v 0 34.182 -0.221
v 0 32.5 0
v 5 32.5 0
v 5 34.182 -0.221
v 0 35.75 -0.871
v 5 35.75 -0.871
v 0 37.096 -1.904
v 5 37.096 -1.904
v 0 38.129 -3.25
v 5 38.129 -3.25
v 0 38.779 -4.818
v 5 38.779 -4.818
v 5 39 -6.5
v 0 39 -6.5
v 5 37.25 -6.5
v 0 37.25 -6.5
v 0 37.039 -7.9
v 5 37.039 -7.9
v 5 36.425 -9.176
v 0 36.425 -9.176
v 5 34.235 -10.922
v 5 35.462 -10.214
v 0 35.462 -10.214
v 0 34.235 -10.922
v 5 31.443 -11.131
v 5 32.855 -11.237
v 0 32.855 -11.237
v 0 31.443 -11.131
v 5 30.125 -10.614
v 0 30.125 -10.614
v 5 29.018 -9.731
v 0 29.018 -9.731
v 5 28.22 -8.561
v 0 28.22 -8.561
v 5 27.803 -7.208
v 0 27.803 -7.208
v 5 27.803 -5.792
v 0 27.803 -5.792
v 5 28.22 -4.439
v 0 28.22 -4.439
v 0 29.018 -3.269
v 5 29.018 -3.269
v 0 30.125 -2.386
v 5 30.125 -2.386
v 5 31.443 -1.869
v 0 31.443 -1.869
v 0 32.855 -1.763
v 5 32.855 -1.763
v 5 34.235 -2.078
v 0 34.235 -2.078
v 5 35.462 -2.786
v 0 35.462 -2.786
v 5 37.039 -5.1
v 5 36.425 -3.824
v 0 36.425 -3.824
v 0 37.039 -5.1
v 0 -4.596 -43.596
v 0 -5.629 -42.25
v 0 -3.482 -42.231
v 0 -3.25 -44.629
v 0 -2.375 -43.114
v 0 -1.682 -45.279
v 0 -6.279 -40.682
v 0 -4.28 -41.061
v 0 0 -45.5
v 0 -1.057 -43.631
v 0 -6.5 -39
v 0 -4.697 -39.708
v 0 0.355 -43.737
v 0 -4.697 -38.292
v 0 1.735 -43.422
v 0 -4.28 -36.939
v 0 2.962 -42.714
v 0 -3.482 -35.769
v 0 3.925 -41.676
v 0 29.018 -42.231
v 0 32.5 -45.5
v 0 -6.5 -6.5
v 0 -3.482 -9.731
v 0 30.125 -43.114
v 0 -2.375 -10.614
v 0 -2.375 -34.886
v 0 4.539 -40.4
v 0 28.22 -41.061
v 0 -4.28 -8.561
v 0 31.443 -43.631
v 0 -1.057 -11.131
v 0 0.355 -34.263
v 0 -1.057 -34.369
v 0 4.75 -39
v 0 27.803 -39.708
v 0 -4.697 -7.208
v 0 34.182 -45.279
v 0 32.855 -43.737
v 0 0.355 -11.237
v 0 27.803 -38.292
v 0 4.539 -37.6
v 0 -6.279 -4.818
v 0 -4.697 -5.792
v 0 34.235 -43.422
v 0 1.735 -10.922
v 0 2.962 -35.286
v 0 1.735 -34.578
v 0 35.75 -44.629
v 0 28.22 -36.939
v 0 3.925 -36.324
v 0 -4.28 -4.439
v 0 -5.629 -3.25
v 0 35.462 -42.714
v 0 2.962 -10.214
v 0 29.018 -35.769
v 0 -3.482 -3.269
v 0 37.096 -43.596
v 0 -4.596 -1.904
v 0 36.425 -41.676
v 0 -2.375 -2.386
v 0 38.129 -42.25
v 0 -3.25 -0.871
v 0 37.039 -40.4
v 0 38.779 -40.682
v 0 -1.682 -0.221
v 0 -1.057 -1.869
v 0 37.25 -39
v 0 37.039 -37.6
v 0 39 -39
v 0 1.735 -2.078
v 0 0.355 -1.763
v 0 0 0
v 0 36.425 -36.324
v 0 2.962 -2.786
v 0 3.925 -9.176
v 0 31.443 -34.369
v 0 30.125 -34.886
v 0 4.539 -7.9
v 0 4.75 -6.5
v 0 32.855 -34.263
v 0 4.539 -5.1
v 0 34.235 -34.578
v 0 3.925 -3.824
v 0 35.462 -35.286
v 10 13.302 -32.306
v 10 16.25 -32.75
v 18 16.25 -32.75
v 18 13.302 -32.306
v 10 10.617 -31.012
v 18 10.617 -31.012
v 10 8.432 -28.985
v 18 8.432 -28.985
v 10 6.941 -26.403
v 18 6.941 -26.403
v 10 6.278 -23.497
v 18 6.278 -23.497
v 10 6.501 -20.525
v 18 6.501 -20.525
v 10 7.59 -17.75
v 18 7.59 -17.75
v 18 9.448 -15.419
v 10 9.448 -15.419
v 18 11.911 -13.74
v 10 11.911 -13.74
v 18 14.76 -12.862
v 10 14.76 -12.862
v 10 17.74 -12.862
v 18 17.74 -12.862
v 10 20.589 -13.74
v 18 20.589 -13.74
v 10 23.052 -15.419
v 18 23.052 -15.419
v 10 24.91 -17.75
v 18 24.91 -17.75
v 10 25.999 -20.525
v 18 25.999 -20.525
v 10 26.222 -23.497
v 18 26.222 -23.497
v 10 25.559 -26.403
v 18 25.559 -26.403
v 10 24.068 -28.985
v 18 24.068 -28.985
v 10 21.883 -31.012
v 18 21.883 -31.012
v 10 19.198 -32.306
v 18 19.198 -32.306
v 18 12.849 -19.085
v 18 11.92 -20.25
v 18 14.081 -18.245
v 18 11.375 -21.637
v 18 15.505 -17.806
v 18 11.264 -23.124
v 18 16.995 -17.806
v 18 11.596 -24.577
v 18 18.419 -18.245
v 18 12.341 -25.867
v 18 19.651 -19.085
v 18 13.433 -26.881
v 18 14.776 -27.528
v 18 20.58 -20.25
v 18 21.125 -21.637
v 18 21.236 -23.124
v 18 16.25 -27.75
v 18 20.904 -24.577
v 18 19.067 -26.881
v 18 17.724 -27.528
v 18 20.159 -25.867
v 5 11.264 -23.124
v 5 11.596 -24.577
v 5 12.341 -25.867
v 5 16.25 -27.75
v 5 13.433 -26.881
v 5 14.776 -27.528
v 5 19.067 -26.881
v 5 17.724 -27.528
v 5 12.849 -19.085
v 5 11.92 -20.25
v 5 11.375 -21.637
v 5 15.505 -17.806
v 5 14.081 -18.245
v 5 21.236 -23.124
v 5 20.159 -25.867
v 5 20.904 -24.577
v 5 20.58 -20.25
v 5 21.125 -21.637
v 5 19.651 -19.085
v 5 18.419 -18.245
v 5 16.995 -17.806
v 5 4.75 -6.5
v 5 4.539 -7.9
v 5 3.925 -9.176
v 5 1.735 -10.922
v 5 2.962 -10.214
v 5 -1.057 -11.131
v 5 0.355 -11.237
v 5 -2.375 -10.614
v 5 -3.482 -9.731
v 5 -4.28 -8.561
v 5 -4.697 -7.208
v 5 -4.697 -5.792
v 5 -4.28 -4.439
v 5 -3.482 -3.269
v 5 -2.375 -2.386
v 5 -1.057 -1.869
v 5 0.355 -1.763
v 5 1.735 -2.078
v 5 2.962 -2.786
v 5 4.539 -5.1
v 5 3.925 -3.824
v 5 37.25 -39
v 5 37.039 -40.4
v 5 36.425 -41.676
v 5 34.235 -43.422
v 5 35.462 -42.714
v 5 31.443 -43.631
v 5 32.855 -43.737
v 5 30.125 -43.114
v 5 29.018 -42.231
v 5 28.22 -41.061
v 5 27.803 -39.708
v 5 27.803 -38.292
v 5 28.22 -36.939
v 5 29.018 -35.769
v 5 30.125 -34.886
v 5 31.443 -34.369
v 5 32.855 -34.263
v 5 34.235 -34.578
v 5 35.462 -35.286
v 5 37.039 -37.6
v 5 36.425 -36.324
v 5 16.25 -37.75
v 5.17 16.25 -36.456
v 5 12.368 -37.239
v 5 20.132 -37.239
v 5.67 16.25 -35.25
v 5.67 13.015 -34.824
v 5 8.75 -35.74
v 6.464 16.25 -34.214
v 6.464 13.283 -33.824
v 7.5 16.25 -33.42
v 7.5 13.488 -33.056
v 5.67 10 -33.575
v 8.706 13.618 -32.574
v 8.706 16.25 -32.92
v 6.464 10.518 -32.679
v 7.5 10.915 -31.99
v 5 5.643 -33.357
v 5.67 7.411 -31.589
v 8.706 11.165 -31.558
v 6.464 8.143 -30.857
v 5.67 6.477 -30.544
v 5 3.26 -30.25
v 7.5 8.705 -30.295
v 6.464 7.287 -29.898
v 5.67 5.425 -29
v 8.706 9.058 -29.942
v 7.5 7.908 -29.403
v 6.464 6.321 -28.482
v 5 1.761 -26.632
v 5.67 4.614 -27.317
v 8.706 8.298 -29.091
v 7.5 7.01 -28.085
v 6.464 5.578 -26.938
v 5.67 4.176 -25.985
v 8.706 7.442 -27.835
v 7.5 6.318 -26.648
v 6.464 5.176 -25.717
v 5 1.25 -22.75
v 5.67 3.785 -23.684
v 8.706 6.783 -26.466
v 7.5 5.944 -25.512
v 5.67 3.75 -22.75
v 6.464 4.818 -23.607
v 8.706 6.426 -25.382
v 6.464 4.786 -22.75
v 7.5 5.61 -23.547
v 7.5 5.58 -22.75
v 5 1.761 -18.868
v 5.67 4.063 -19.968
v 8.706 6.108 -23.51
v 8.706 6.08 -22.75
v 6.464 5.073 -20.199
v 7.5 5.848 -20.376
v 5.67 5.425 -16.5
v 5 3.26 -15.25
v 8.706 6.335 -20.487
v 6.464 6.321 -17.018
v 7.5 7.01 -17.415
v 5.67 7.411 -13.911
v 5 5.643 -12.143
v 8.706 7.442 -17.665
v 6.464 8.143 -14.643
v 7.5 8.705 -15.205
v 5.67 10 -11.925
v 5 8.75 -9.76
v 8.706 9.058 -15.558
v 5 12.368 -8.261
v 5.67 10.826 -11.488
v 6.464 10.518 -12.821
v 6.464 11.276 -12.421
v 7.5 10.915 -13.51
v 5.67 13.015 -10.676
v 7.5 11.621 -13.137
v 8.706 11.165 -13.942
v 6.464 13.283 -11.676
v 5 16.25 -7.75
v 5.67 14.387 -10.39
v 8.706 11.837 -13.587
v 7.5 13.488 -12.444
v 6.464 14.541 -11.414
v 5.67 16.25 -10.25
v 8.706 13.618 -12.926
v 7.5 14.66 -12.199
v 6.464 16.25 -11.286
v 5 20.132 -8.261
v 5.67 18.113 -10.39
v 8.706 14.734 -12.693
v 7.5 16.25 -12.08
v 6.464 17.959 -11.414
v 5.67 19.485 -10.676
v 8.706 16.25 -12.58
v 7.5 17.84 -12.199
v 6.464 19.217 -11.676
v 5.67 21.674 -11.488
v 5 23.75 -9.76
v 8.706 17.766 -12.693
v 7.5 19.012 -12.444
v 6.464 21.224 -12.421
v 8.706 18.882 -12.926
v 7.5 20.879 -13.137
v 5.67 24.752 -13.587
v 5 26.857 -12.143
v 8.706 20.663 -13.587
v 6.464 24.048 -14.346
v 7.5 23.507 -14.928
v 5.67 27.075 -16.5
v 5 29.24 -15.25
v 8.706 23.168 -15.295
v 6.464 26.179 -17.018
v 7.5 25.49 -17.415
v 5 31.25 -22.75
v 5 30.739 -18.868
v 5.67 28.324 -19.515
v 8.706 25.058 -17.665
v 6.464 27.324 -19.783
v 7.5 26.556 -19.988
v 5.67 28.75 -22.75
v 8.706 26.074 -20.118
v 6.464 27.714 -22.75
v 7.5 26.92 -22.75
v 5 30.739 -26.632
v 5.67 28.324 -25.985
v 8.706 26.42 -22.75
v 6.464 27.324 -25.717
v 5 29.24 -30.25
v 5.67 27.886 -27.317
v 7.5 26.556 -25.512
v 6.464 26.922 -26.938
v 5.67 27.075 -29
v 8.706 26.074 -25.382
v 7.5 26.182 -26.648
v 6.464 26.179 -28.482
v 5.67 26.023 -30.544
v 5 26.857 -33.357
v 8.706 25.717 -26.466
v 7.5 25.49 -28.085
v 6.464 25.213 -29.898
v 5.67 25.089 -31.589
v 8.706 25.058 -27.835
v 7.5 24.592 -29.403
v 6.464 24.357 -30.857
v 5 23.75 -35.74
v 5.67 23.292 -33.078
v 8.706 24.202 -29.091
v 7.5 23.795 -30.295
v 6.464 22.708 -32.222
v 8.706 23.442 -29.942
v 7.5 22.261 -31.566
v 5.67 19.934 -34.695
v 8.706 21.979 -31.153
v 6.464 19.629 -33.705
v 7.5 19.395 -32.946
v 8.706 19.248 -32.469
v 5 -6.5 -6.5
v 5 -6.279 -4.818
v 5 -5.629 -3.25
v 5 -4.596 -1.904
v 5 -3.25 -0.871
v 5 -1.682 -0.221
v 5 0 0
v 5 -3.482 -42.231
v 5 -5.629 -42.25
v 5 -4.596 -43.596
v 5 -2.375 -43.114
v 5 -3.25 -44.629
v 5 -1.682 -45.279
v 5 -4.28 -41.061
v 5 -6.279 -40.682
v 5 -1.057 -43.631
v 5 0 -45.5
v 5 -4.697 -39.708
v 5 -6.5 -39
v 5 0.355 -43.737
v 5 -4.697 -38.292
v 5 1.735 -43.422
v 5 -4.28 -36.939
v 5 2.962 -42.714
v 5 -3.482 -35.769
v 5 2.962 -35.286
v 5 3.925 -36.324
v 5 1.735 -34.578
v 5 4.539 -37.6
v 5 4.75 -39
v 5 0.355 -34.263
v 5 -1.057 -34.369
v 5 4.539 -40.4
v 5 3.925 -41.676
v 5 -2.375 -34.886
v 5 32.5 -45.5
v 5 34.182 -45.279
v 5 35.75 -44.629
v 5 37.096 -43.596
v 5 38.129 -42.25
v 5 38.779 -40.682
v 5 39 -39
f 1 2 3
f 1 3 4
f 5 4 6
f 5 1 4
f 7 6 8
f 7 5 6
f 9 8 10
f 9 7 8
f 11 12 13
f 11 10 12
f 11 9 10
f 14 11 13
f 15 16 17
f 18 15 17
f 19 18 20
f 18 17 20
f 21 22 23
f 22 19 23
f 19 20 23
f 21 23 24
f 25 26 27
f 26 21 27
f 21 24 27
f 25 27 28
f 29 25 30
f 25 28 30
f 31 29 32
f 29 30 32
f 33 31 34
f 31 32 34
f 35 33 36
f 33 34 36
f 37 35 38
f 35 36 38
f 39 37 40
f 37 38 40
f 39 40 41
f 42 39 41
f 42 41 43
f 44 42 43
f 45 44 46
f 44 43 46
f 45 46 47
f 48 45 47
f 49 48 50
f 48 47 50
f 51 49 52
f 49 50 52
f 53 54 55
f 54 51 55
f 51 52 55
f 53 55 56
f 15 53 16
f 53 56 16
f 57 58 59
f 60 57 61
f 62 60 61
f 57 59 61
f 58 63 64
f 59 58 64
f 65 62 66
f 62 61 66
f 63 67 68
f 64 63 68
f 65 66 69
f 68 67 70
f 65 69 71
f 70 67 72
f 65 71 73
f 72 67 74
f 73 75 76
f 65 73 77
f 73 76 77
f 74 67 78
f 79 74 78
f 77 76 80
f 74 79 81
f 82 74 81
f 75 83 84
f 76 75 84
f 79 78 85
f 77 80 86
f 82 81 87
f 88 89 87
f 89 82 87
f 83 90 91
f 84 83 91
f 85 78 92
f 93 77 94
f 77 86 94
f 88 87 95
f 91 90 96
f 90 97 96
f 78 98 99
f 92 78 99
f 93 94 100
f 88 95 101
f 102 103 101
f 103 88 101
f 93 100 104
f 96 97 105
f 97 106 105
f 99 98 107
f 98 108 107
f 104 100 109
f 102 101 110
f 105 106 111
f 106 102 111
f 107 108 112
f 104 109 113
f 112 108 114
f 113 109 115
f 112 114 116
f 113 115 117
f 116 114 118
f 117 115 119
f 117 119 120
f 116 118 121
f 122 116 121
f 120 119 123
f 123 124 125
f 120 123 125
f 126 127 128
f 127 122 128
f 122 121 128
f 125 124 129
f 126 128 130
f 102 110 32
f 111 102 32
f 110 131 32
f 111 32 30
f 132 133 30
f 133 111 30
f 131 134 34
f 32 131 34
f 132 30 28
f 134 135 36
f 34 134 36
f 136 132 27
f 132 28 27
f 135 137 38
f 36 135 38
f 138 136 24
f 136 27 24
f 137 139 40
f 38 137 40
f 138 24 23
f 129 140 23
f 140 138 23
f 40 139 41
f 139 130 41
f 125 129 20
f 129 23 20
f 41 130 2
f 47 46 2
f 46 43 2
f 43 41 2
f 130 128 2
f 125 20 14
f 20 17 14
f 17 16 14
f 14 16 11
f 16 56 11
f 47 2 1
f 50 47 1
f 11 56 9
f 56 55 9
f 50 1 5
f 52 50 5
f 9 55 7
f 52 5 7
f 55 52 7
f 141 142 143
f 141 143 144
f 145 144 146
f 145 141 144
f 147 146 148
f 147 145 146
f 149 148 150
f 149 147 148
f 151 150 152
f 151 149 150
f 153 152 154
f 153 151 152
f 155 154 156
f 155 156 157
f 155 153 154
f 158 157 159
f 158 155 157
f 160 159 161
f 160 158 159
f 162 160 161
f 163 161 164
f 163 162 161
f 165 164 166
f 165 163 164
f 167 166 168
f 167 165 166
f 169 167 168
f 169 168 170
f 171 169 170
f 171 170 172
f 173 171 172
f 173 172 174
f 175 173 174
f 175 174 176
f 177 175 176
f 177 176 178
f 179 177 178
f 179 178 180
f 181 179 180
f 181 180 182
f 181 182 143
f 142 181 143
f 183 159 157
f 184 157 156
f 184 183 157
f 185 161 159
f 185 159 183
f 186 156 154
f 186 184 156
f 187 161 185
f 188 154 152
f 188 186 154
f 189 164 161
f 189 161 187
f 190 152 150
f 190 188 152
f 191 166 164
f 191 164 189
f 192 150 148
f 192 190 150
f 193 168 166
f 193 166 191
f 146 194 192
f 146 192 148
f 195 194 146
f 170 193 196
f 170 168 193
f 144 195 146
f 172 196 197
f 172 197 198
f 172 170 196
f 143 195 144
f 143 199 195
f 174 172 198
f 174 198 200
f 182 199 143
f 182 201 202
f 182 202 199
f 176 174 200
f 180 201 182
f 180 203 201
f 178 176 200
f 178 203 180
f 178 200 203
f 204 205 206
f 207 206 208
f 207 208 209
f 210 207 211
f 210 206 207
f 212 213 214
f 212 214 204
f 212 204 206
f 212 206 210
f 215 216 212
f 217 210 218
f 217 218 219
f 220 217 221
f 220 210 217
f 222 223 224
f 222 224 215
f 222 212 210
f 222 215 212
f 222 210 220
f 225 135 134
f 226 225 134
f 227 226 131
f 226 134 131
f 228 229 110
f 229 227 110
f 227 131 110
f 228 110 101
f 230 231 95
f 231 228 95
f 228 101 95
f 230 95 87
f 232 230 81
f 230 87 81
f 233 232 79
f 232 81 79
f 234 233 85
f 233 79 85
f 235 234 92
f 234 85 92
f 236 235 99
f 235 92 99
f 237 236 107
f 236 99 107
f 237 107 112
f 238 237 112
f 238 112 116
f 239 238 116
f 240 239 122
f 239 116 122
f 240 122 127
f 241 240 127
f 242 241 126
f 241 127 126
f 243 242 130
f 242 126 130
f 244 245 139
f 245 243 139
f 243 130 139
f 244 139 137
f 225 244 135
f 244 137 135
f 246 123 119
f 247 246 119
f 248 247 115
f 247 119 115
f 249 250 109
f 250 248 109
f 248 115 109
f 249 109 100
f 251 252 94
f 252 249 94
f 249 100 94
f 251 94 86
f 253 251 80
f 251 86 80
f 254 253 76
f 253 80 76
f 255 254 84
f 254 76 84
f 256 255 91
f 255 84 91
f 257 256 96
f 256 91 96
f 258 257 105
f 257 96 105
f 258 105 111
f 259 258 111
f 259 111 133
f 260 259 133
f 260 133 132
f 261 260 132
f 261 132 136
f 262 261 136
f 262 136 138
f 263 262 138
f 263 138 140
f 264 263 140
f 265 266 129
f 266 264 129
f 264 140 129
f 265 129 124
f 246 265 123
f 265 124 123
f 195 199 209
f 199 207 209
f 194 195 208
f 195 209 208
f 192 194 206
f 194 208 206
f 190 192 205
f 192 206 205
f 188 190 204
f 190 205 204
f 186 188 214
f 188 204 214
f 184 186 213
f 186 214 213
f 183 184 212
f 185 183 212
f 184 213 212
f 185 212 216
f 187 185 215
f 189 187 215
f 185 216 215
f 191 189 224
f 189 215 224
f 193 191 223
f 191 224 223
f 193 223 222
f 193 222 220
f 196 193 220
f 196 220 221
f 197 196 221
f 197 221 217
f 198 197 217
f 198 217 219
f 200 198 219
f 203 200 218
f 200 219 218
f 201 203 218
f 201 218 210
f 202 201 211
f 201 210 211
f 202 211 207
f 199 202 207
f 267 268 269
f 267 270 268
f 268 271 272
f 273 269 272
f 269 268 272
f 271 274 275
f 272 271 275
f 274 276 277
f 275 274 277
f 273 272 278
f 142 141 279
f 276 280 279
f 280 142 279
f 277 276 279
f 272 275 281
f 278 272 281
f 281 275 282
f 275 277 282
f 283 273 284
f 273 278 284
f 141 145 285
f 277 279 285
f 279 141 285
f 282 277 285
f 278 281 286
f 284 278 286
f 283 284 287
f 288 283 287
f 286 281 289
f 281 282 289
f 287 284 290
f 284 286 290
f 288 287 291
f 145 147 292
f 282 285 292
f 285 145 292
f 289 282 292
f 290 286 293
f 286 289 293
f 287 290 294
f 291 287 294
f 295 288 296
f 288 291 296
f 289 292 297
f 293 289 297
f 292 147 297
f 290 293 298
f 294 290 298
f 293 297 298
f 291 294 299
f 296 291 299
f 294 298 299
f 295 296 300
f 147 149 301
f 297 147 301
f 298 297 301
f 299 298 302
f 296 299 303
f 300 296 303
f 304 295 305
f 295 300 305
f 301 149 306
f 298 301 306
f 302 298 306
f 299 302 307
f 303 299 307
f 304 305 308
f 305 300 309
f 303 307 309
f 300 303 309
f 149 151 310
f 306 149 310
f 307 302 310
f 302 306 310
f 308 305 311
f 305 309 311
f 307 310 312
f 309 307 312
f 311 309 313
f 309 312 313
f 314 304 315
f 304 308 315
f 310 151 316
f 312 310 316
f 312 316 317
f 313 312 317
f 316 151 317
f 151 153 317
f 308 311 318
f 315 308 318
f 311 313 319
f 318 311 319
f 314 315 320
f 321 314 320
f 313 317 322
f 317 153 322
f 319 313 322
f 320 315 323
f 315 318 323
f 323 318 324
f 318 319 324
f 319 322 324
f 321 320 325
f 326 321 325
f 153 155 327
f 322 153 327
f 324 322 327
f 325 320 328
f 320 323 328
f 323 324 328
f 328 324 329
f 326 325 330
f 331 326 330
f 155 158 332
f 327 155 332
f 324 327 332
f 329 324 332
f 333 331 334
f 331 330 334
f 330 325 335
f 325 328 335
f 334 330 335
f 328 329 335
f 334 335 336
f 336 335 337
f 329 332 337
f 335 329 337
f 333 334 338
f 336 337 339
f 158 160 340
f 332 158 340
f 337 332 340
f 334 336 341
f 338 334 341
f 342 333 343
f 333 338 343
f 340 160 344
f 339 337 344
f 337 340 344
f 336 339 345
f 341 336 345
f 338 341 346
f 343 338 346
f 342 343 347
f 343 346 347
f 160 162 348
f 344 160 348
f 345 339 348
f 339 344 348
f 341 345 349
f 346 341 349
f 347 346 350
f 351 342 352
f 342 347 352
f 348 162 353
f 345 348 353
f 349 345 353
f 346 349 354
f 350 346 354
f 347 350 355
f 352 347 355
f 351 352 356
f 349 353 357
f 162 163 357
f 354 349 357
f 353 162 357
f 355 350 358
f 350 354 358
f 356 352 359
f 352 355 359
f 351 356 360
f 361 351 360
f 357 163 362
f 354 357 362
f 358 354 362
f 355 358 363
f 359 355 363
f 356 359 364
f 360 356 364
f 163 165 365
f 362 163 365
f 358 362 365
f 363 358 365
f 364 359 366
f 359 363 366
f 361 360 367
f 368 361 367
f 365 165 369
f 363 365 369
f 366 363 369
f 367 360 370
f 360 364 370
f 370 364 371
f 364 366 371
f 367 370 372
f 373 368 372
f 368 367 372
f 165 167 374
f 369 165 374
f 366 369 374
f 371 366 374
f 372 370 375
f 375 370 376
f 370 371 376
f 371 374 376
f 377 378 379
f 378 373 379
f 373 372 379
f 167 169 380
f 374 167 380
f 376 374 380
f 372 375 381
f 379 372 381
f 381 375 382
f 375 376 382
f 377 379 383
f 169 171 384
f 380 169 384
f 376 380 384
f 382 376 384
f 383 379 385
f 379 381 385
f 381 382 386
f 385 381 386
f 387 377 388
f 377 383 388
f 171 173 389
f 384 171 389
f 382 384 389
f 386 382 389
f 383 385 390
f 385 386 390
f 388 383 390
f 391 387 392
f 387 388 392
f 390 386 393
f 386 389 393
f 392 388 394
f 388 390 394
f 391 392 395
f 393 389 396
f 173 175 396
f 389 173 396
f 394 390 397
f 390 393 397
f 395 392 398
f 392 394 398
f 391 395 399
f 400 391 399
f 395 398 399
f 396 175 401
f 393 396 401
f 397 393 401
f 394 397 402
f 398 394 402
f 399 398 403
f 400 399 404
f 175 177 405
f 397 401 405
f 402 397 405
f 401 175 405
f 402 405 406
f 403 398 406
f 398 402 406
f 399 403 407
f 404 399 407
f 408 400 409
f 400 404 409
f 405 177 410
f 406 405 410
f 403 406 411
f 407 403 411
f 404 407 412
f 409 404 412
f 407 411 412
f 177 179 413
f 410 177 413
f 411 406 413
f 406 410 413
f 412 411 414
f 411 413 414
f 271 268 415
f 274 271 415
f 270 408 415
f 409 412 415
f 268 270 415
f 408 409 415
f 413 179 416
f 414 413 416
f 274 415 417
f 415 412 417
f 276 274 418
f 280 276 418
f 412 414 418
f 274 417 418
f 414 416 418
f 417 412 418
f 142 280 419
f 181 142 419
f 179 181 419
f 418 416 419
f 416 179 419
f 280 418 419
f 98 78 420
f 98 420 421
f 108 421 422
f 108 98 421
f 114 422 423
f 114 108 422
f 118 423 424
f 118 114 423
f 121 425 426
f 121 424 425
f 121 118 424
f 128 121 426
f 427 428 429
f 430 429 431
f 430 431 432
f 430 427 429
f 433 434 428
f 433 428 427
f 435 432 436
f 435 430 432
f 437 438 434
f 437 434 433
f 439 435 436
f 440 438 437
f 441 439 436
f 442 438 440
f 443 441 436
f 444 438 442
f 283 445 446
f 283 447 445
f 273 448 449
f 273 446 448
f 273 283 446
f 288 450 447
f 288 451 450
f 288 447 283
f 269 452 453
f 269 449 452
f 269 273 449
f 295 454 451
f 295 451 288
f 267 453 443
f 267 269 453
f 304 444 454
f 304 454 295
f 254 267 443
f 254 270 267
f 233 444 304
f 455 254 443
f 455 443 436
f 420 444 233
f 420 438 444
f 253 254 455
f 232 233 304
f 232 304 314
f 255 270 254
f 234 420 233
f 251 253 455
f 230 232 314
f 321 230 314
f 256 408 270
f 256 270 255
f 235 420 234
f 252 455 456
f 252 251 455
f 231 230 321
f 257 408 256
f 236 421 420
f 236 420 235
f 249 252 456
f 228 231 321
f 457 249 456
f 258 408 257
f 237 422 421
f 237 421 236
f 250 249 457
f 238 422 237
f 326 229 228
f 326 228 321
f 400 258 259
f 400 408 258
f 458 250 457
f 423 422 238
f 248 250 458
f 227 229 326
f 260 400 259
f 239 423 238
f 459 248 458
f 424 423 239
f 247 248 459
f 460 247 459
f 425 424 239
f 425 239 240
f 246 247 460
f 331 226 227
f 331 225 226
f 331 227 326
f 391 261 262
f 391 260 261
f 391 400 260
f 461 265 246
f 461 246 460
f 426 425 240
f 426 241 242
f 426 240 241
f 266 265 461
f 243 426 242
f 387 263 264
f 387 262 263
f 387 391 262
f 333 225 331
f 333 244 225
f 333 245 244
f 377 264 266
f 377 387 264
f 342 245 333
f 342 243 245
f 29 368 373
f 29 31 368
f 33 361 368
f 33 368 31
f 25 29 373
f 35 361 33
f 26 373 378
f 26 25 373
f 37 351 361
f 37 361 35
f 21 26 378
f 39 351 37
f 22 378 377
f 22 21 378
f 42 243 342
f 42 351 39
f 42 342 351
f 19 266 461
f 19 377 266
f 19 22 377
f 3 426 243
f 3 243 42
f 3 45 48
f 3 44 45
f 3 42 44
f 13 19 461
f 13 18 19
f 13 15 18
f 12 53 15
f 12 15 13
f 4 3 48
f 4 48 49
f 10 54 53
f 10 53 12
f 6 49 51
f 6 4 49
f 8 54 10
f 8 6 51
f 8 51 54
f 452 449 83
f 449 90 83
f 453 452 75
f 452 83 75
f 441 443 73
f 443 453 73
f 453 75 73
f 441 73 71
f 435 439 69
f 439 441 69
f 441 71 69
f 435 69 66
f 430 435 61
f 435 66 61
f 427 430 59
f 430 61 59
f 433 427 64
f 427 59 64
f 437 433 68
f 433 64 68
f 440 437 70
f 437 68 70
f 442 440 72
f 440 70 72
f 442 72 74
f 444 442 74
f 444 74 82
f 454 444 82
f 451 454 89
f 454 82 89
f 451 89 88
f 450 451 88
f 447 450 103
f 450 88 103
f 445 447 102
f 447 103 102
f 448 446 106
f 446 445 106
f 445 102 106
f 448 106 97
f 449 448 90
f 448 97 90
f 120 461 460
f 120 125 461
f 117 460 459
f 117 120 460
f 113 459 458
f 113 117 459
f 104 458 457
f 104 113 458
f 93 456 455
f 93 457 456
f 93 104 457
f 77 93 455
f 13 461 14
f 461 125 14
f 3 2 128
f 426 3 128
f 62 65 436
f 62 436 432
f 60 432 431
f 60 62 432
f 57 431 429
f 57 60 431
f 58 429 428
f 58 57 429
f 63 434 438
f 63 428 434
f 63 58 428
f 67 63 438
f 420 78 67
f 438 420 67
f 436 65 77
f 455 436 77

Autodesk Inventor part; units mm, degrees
ref_plane "YZ Plane" through (0, 0, 0) normal (1, 0, 0) x (0, 1, 0)
ref_plane "XZ Plane" through (0, 0, 0) normal (0, 1, 0) x (-1, 0, 0)
ref_plane "XY Plane" through (0, 0, 0) normal (0, 0, 1) x (1, 0, 0)
sketch "Sketch1" plane through (0, 0, 0) normal (1, 0, 0) x (0, 1, 0)
  line L0 (-6, -12.5) -> (-6, -12.9)
  arc A0 (-6, -12.9) -> (-5.6, -13.3) centre (-5.6, -12.9) ccw
  line L1 (-5.6, -13.3) -> (-4.9, -13.3)
  arc A1 (-4.9, -13.3) -> (-4.7, -13.1) centre (-4.9, -13.1) ccw
  line L2 (-4.7, -13.1) -> (-4.7, -12.85)
  arc A2 (-4.5, -12.65) -> (-4.7, -12.85) centre (-4.5, -12.85) ccw
  line L3 (-4.5, -12.65) -> (-1.8, -12.65)
  arc A3 (-1.4, -13.05) -> (-1.8, -12.65) centre (-1.8, -13.05) ccw
  line L4 (-1.4, -13.05) -> (-1.4, -18.75)
  line L5 (-1.8, -19.15) -> (-4.5, -19.15)
  arc A4 (-1.8, -19.15) -> (-1.4, -18.75) centre (-1.8, -18.75) ccw
  arc A5 (-4.7, -18.95) -> (-4.5, -19.15) centre (-4.5, -18.95) ccw
  line L6 (-4.7, -18.95) -> (-4.7, -18.7)
  arc A6 (-4.7, -18.7) -> (-4.9, -18.5) centre (-4.9, -18.7) ccw
  line L7 (-4.9, -18.5) -> (-5.6, -18.5)
  arc A7 (-5.6, -18.5) -> (-6, -18.9) centre (-5.6, -18.9) ccw
  line L8 (-6, -18.9) -> (-6, -19.5)
  line L9 (-6.5, -6.5) -> (-6.5, -12.5)
  line L10 (-6.5, -12.5) -> (-2.5, -12.5)
  line L11 (-1.05, -19.5) -> (-6.5, -19.5)
  line L12 (-6.5, -19.5) -> (-6.5, -26)
  line L13 (-6.5, -26) -> (-1.05, -26)
  line L14 (-6, -26) -> (-6, -26.6)
  arc A8 (-6, -26.6) -> (-5.6, -27) centre (-5.6, -26.6) ccw
  line L15 (-5.6, -27) -> (-4.9, -27)
  arc A9 (-4.9, -27) -> (-4.7, -26.8) centre (-4.9, -26.8) ccw
  arc A10 (-4.5, -26.35) -> (-4.7, -26.55) centre (-4.5, -26.55) ccw
  line L16 (-4.7, -26.8) -> (-4.7, -26.55)
  line L17 (-4.5, -26.35) -> (-1.8, -26.35)
  arc A11 (-1.4, -26.75) -> (-1.8, -26.35) centre (-1.8, -26.75) ccw
  line L18 (-1.4, -26.75) -> (-1.4, -32.45)
  arc A12 (-1.8, -32.85) -> (-1.4, -32.45) centre (-1.8, -32.45) ccw
  line L19 (-1.8, -32.85) -> (-4.5, -32.85)
  arc A13 (-4.7, -32.65) -> (-4.5, -32.85) centre (-4.5, -32.65) ccw
  line L20 (-4.7, -32.65) -> (-4.7, -32.4)
  arc A14 (-4.7, -32.4) -> (-4.9, -32.2) centre (-4.9, -32.4) ccw
  line L21 (-4.9, -32.2) -> (-5.6, -32.2)
  arc A15 (-5.6, -32.2) -> (-6, -32.6) centre (-5.6, -32.6) ccw
  line L22 (-6, -32.6) -> (-6, -33)
  line L23 (-2.5, -33) -> (-6.5, -33)
  line L24 (-6.5, -33) -> (-6.5, -39)
  line L25 (32.5, 0) -> (0, 0)
  circle A16 centre (0, -6.5) radius 4.75
  circle A17 centre (32.5, -6.5) radius 4.75
  circle A18 centre (0, -39) radius 4.75
  circle A19 centre (32.5, -39) radius 4.75
  line L26 (39, -26) -> (39, -19.5)
  line L27 (39, -12.5) -> (39, -6.5)
  line L28 (39, -39) -> (39, -33)
  line L29 (26.5, -45.5) -> (32.5, -45.5)
  line L30 (0, -45.5) -> (6, -45.5)
  line L31 (13, -45.5) -> (19.5, -45.5)
  circle A20 centre (16.25, -22.75) radius 15
  circle A21 centre (16.2588, 5.0016) radius 2.5
  circle A22 centre (16.25, -50.5) radius 2.5
  circle A23 centre (16.25, -22.75) radius 5
  circle A24 centre (16.25, -22.75) radius 8.45
  line L32 (24.75, -27.6575) -> (24.75, -17.8425)
  line L33 (44, 10) -> (-11.5, 10)
  line L34 (-11.5, 10) -> (-11.5, -55.5)
  line L35 (-11.5, -55.5) -> (44, -55.5)
  line L36 (44, -55.5) -> (44, 10)
  line L37 (-11.5, 30) -> (44, 30)
  line L38 (-11.5, -75.5) -> (-11.5, 30)
  line L39 (44, 30) -> (44, -75.5)
  line L40 (44, -75.5) -> (-11.5, -75.5)
  circle A25 centre (16.25, -65.5) radius 5
  circle A26 centre (16.25, 20) radius 5
  arc A27 (39, -6.5) -> (32.5, 0) centre (32.5, -6.5) ccw
  arc A28 (32.5, -45.5) -> (39, -39) centre (32.5, -39) ccw
  arc A29 (0, 0) -> (-6.5, -6.5) centre (0, -6.5) ccw
  arc A30 (-6.5, -39) -> (0, -45.5) centre (0, -39) ccw
  line L41 (39, -12.5) -> (39, -33)
  line L42 (26.5, -45.5) -> (6, -45.5)
  line L43 (-6.5, -12.5) -> (-6.5, -33)
extrude "Extrusion1" add sketch "Sketch1" along normal blind 5 contours L10 L9 A29 L25 A27 L27 L41 L26 L28 A28 L29 L42 L31 L30 A30 L24 L23 L22 A15 L21 A14 L20 A13 L19 A12 L18 A11 L17 A10 L16 A9 L15 A8 L14 L13 L12 L11 L8 A7 L7 A6 L6 A5 L5 A4 L4 A3 L3 A2 L2 A1 L1 A0 L0 | L0 A0 L1 A1 L2 A2 L3 A3 L4 A4 L5 A5 L6 A6 L7 A7 L8 L11 L43 L10 | L13 L14 A8 L15 A9 L16 A10 L17 A11 L18 A12 L19 A13 L20 A14 L21 A15 L22 L23 L43 | A20 | A23 | A24
sketch "Sketch2" plane through (5, 0, 0) normal (1, 0, 0) x (0, 0, -1)
  circle A0 centre (6.5, 32.5) radius 4.75 projected
  circle A1 centre (39, 0) radius 4.75 projected
  line L0 (6.5, 32.5) -> (39, 0)
  circle A2 centre (39, 32.5) radius 4.75 projected
  line L1 (39, 0) -> (39, 32.5)
  line L2 (39, 32.5) -> (6.5, 0)
  circle A3 centre (22.75, 16.25) radius 5
  circle A4 centre (22.75, 16.25) radius 10
  point P0 (0, 0)
  dimension "d2" = 10
  dimension "d3" = 20
extrude "Extrusion2" add sketch "Sketch2" along normal blind 13 contours A4 L2 A3 L0 | L0 A3 L2 A4 | A4 L0 A3 L2 | L2 A3 L0 A4
fillet "Fillet1" radius 5 1 edges at (5, 16.25, -12.75)
properties part number "CodoHidráulicos"
